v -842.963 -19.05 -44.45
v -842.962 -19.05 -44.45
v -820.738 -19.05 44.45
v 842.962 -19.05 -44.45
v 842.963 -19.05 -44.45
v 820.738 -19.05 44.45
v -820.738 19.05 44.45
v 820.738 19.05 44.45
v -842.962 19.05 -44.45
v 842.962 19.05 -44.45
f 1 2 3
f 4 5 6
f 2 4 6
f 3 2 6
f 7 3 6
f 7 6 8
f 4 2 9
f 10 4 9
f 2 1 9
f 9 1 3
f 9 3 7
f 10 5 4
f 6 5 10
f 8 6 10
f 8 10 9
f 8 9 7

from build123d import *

# Parameters (mm, degrees)
F0_W     = 38.1
F0_H     = 88.9
F1_DEPTH = 842.9625
F2_SIZE2 = 88.89999
F2_SIZE  = 22.22499


# Not quite as in the source:
# - a fillet or chamfer is up to 0.001 mm smaller than in the source, because OpenCascade refuses the exact size


with BuildPart() as f1:
    # F0 (on Right) → F1 (new body, symmetric)
    with BuildSketch(Plane.YZ):
        Rectangle(F0_W, F0_H)
    extrude(amount=F1_DEPTH, both=True)

    # F2 (size 22.225 and 88.9 in the source; OpenCascade refuses exactly that, so slightly less here)
    f2_edges = [f1.edges().sort_by_distance(p)[0] for p in [
        (842.9625, 0, 44.45),
        (-842.9625, 0, 44.45),
    ]]
    f2_side = f1.faces().sort_by_distance((0, 0, 44.45))[0]
    chamfer(f2_edges, length=F2_SIZE, length2=F2_SIZE2, reference=f2_side)


solid = f1.part
